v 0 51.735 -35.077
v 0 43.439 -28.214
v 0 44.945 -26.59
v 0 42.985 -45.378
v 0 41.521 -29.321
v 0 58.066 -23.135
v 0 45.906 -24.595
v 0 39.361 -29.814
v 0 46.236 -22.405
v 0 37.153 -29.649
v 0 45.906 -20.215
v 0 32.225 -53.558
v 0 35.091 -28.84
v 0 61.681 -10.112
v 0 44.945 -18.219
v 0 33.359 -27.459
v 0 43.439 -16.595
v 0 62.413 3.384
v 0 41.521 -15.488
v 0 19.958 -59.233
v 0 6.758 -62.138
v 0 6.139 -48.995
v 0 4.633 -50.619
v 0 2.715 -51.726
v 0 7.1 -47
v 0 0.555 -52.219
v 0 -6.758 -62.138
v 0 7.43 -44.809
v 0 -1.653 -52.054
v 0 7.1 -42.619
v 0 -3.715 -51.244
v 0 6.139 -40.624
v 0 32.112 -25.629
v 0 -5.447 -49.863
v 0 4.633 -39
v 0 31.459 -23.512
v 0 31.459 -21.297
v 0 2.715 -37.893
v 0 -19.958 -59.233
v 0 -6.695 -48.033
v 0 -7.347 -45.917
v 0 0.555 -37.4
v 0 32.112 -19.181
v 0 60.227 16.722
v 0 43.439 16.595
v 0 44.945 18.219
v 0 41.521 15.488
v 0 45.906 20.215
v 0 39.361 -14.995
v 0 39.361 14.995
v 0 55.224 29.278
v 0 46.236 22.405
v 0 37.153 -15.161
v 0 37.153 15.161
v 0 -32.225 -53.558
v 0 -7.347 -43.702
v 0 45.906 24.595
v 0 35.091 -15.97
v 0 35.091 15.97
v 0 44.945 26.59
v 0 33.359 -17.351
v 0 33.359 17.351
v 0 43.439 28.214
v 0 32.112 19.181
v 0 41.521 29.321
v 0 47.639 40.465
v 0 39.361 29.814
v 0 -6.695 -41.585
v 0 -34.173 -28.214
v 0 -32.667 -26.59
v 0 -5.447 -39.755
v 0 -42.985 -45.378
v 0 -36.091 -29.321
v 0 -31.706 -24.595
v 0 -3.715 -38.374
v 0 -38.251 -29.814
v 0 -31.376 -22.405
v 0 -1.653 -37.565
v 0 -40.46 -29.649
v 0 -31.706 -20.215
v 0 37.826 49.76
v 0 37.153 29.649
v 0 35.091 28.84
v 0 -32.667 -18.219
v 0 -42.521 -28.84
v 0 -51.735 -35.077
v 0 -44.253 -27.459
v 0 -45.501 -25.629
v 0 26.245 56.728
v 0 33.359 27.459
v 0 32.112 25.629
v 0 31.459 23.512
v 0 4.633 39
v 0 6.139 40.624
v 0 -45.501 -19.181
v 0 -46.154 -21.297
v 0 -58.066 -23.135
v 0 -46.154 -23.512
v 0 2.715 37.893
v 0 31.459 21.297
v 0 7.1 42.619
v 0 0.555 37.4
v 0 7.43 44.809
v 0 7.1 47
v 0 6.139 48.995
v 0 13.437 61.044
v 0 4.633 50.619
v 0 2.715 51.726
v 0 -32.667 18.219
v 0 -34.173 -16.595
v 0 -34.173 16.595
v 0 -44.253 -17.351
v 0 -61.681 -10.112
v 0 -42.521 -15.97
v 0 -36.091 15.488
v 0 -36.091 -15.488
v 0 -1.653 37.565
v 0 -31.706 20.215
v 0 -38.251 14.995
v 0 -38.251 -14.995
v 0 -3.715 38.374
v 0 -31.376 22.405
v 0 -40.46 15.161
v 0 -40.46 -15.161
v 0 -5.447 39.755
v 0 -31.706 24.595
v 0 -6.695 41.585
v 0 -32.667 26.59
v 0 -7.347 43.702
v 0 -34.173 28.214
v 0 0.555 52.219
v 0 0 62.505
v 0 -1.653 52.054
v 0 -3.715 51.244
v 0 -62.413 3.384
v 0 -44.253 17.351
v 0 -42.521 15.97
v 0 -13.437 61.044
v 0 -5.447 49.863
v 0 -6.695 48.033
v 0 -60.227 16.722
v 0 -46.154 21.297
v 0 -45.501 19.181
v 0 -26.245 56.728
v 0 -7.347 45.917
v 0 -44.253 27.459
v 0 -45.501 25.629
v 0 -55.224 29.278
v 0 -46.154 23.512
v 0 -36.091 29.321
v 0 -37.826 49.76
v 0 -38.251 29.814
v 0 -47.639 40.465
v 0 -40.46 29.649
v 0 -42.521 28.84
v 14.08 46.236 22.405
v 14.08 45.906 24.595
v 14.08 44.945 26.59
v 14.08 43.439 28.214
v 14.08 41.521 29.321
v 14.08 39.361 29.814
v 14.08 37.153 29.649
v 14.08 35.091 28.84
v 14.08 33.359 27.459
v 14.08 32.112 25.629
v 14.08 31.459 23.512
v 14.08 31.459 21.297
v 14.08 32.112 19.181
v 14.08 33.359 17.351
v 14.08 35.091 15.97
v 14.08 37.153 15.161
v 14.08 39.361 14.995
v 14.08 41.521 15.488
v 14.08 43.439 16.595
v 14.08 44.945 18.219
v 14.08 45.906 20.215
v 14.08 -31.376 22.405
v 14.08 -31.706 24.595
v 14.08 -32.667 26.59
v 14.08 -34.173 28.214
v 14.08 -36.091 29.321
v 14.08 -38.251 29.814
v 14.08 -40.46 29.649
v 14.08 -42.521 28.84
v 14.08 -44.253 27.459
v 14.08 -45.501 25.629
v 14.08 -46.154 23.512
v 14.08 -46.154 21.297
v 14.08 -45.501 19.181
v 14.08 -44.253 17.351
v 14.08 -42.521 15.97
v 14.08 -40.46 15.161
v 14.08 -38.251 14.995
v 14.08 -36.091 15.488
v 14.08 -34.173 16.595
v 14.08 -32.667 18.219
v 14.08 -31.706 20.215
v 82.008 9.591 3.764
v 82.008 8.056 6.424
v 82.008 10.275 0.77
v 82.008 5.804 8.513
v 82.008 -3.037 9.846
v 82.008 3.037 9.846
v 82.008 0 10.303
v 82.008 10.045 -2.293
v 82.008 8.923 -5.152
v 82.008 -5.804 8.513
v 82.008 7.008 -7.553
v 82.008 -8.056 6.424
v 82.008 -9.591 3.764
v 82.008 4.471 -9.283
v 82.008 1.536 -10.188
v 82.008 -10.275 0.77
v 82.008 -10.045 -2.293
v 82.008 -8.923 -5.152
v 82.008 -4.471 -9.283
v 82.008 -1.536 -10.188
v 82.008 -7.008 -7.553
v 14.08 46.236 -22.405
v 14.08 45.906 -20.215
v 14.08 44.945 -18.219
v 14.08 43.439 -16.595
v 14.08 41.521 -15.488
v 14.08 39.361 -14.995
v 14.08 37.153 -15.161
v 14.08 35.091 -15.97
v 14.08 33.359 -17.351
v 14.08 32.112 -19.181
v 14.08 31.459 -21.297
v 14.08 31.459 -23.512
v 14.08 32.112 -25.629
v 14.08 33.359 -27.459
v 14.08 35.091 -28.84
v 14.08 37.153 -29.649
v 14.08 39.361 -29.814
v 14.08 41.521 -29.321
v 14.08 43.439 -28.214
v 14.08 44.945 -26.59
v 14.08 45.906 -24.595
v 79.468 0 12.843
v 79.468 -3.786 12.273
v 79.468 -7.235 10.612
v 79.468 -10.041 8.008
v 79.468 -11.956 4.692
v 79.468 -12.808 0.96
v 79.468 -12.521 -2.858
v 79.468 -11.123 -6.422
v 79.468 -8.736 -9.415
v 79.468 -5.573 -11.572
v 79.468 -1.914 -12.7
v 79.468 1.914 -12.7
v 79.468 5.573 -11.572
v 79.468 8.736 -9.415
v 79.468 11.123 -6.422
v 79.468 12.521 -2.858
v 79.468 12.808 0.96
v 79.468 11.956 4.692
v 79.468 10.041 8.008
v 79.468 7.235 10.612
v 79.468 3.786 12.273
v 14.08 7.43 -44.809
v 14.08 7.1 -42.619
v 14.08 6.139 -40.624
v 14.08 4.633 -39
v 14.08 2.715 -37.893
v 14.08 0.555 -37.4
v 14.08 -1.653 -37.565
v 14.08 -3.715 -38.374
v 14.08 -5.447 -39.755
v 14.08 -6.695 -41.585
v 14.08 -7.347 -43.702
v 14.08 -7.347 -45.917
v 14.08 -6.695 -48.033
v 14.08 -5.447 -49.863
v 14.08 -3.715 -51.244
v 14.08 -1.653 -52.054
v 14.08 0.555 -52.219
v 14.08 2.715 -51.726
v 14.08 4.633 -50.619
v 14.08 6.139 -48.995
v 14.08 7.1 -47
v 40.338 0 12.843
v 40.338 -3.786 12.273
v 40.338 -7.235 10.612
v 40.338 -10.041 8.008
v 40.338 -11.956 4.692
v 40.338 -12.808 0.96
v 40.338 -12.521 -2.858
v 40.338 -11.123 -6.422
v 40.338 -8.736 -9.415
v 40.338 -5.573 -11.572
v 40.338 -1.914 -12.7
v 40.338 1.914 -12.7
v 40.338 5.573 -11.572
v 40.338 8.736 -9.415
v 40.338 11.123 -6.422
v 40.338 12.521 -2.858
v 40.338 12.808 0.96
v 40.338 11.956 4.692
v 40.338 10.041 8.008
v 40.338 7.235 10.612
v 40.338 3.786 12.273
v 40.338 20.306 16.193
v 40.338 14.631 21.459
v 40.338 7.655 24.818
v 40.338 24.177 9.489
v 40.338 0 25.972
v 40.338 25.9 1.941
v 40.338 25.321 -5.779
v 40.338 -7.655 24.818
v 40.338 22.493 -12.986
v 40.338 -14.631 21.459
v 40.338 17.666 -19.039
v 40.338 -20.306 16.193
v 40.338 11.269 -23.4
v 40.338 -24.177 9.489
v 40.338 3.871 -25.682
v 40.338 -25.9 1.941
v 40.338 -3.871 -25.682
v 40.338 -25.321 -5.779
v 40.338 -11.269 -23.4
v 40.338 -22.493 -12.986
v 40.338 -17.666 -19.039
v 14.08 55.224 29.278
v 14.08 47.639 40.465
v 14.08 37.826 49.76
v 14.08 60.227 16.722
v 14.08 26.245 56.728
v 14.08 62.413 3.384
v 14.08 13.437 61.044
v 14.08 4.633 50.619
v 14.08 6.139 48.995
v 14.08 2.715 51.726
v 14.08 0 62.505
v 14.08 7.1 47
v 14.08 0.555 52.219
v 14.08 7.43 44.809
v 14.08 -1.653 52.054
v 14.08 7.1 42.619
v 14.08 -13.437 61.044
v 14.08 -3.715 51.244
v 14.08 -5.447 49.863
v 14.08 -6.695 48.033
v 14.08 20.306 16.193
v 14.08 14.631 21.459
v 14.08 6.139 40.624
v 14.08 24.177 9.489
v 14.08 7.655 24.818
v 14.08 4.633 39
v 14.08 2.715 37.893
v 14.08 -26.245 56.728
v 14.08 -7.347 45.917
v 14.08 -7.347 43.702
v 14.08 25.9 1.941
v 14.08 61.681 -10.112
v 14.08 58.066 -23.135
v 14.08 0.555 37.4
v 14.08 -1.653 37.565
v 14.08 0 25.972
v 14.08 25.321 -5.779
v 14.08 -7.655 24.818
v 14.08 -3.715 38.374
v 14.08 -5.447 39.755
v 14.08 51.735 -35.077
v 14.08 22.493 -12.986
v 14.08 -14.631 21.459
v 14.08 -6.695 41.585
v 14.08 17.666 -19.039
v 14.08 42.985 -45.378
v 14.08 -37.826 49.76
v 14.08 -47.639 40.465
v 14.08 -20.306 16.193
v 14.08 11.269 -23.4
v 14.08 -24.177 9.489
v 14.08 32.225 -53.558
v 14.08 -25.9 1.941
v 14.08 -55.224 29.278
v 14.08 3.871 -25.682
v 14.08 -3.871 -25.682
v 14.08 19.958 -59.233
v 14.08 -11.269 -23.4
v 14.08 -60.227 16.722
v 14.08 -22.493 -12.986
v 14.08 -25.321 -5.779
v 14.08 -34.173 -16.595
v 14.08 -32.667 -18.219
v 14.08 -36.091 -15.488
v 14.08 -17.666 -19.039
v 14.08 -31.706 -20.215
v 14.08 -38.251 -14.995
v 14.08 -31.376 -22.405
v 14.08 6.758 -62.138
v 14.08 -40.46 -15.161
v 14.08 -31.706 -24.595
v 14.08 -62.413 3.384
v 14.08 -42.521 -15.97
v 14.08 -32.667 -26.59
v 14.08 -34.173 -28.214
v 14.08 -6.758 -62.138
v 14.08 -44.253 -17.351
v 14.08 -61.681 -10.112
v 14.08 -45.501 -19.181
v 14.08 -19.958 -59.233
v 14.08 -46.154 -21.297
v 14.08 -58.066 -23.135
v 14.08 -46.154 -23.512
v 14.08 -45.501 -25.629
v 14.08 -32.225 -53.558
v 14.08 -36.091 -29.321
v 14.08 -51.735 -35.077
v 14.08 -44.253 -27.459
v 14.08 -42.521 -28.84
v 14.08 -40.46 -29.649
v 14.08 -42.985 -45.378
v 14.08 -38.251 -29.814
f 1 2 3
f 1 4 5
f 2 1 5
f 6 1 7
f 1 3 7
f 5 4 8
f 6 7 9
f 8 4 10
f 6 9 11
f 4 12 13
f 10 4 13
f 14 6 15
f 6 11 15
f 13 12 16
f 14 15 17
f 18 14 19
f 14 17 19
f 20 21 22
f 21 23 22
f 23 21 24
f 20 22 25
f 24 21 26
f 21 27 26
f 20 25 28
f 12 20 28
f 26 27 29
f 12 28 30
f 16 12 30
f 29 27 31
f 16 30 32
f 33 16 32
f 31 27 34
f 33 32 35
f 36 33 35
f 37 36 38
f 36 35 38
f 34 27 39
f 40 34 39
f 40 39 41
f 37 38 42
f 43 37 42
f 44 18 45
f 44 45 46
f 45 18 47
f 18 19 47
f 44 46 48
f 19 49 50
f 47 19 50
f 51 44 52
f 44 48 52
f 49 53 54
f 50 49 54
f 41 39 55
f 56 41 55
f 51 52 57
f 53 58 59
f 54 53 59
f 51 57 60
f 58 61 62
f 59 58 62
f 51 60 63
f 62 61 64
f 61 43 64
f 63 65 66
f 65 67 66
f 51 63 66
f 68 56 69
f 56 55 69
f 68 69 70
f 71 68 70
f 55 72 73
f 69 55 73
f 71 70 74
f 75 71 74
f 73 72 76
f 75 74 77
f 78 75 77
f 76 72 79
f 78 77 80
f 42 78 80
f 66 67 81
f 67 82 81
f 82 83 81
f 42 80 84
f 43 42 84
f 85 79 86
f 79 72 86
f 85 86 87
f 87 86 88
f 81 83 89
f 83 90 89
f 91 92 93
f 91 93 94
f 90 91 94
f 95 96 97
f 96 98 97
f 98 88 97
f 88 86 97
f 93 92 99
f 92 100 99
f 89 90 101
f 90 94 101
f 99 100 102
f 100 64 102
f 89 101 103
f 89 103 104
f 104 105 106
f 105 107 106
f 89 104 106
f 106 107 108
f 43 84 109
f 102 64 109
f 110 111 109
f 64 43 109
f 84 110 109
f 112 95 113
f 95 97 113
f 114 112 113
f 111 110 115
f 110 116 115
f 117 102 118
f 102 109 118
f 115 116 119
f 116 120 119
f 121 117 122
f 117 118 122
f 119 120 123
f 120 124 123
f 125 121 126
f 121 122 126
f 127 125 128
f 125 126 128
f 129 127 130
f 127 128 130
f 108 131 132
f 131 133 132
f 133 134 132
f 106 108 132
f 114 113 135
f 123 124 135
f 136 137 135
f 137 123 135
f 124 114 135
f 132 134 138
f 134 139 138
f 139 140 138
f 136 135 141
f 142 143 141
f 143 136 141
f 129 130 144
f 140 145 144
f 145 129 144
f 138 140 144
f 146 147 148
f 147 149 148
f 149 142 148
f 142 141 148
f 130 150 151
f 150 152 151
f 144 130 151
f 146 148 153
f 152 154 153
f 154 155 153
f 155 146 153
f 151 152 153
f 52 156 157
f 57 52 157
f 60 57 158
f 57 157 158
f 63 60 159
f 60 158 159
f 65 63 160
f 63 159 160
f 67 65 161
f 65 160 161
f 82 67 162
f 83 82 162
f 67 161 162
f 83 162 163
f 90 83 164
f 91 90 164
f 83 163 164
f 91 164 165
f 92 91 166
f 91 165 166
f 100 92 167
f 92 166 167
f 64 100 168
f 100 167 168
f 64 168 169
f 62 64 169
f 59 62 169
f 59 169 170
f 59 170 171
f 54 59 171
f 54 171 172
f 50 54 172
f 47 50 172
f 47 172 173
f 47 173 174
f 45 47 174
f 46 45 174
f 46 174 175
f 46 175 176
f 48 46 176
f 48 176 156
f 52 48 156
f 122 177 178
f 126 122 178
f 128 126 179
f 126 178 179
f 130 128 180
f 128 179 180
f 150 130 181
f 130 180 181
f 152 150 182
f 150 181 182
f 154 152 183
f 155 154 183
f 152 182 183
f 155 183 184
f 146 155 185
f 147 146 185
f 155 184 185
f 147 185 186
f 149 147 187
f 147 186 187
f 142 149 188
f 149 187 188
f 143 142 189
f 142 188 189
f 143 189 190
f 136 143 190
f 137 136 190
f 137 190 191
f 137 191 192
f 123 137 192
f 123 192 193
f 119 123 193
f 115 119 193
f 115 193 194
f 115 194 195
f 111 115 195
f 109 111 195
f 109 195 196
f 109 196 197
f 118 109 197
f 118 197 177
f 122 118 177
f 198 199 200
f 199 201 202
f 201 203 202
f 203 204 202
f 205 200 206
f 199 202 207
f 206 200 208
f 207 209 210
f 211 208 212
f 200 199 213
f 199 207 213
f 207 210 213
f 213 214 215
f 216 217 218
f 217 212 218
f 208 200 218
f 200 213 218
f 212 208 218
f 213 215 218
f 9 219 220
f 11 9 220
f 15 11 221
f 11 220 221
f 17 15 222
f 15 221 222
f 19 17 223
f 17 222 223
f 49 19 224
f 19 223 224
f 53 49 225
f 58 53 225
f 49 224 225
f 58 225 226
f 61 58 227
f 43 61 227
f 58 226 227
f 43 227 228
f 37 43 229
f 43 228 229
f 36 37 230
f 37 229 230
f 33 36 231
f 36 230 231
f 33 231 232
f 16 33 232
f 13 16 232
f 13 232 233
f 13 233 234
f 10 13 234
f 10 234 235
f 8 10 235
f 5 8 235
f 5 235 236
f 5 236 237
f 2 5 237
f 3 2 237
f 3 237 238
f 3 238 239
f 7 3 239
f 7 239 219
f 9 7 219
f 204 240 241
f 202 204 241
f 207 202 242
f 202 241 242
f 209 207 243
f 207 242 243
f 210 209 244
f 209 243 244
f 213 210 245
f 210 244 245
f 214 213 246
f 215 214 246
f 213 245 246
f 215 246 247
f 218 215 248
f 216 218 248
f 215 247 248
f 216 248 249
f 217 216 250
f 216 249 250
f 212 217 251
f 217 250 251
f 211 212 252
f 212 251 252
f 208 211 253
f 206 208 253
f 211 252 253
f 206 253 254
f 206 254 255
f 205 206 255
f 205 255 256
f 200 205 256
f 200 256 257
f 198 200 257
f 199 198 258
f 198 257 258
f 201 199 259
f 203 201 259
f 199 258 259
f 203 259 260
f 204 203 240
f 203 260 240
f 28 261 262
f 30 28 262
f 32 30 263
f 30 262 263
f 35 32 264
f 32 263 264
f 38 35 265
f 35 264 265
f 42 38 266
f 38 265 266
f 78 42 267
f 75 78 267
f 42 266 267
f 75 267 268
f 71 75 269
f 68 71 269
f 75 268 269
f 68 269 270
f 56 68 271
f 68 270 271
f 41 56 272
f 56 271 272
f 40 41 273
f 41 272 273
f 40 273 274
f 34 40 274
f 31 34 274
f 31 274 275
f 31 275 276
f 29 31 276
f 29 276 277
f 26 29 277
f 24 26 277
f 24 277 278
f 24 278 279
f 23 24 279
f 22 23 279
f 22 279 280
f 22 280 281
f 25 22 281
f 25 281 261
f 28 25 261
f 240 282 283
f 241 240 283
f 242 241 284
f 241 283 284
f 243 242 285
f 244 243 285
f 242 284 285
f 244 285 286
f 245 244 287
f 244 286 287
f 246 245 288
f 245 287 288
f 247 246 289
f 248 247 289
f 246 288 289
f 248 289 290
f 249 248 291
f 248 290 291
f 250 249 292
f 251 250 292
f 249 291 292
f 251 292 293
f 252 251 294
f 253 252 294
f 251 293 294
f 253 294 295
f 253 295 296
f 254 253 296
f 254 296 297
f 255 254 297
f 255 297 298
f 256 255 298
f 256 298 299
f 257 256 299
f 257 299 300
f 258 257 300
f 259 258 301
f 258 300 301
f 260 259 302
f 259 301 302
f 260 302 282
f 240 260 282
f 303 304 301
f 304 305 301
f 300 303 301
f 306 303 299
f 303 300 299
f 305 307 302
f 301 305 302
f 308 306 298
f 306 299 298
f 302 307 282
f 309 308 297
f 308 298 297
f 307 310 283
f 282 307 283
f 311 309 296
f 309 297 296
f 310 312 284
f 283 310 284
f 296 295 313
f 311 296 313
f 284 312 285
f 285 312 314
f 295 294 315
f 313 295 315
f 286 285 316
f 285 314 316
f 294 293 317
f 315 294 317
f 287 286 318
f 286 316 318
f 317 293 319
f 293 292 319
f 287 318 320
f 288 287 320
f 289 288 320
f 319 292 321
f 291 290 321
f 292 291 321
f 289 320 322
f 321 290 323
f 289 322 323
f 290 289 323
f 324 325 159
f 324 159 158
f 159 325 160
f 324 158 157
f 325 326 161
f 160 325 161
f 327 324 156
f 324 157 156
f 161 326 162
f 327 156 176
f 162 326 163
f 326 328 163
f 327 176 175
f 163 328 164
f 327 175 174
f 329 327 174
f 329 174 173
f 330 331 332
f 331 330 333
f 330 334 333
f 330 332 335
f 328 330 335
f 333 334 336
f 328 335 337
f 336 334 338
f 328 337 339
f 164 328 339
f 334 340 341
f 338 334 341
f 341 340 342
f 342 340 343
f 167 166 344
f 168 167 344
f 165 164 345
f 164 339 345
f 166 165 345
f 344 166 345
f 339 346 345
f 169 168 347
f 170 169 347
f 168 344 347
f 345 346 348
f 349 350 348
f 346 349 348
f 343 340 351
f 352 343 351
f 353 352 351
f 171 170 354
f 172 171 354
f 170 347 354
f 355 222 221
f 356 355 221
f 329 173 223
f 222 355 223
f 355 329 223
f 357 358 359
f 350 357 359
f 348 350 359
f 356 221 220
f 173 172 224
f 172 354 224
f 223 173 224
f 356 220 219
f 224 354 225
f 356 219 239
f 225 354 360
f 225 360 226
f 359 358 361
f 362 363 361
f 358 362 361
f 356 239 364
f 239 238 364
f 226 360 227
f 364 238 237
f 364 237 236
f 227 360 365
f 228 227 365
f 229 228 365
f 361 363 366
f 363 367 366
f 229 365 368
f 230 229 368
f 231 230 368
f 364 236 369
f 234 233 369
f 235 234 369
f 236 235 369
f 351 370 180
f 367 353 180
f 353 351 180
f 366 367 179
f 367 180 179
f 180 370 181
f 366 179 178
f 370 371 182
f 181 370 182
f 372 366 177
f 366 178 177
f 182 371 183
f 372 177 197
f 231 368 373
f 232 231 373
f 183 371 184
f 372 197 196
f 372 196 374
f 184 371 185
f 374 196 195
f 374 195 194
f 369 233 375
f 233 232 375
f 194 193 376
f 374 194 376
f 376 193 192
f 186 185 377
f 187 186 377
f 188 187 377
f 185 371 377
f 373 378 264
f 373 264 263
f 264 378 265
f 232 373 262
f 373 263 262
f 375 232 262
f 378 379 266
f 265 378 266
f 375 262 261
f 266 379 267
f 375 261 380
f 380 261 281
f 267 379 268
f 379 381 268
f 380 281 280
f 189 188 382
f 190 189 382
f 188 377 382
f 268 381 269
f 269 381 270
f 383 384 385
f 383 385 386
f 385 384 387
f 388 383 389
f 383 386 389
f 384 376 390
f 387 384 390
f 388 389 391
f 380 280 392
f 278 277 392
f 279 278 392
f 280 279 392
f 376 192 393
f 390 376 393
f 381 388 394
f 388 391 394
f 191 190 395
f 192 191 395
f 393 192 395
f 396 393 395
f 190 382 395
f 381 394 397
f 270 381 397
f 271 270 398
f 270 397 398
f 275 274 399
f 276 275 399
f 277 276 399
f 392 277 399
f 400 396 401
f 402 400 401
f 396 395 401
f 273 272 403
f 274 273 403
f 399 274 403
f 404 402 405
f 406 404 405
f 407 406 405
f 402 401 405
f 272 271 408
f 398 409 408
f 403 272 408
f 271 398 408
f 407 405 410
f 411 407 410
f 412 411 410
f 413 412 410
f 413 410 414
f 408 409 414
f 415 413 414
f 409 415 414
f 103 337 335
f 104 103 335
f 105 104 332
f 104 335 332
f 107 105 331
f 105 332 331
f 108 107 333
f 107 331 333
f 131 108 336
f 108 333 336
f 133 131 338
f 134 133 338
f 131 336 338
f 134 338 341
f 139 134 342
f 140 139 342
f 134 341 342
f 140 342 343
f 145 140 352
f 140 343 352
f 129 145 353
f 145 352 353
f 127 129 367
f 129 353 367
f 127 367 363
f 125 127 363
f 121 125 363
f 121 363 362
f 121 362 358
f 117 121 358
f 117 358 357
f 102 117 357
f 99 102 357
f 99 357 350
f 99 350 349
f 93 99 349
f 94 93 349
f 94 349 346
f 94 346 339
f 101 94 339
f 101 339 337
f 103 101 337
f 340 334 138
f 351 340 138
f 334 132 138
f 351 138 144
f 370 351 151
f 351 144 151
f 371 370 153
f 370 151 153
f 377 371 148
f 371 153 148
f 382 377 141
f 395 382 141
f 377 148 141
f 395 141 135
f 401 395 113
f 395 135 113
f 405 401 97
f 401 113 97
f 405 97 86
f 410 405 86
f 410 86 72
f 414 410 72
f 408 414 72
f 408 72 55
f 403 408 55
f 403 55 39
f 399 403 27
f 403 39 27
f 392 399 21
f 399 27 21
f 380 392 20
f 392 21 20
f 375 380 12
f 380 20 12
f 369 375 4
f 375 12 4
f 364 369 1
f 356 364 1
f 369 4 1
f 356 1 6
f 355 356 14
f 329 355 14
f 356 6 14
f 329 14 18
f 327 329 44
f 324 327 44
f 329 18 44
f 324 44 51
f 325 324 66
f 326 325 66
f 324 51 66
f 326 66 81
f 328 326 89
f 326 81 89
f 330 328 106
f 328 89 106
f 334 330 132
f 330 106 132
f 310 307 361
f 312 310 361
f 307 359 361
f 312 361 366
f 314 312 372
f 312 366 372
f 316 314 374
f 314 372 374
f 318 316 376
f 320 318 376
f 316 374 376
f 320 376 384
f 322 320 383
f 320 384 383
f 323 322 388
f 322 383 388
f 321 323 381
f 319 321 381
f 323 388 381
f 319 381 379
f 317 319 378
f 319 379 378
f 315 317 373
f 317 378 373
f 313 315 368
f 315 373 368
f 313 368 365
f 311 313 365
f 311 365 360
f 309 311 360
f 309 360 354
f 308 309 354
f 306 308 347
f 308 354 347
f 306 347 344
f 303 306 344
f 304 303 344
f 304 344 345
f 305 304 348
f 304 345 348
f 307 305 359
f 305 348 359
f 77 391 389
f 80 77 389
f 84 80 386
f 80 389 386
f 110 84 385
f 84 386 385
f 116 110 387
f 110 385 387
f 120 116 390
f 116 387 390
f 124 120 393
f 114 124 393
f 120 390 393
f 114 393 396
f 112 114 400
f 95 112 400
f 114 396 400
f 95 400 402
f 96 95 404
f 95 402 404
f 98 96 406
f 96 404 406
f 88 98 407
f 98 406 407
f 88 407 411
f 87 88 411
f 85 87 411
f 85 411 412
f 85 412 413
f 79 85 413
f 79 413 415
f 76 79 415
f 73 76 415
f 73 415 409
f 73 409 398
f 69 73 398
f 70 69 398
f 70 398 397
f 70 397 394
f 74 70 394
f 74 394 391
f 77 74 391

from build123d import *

# Parameters (mm, degrees)
F2_SIZE  = 2.54
F3_R     = 7.430416
F4_DEPTH = 25.4


with BuildPart() as f1:
    # F0 (on Front) → F1 (revolve)
    with BuildSketch(Plane.XZ):
        Polygon((0, 62.504839), (0, 0), (82.007878, 0), (82.007878, 12.843461), (40.337984, 12.843461), (40.337984, 25.972329), (14.080239, 25.972329), (14.080239, 62.504839), align=None)
    revolve(axis=Axis((41.003939, 0, 0), (1, 0, 0)))

    # F2
    f2_edges = [f1.edges().sort_by_distance(p)[0] for p in [
        (82.007878, 0, -12.843461),
    ]]
    chamfer(f2_edges, length=F2_SIZE)

    # F3 (on face) → F4 (cut)
    with BuildSketch(Plane.YZ.offset(14.080239)):
        with Locations((0, 44.809405)):
            Circle(F3_R)
        with Locations((-38.806083, 22.404702)):
            Circle(F3_R)
        with Locations((-38.806083, -22.404702)):
            Circle(F3_R)
        with Locations((0, -44.809405)):
            Circle(F3_R)
        with Locations((38.806083, -22.404702)):
            Circle(F3_R)
        with Locations((38.806083, 22.404702)):
            Circle(F3_R)
    extrude(amount=-F4_DEPTH, mode=Mode.SUBTRACT)


solid = f1.part
